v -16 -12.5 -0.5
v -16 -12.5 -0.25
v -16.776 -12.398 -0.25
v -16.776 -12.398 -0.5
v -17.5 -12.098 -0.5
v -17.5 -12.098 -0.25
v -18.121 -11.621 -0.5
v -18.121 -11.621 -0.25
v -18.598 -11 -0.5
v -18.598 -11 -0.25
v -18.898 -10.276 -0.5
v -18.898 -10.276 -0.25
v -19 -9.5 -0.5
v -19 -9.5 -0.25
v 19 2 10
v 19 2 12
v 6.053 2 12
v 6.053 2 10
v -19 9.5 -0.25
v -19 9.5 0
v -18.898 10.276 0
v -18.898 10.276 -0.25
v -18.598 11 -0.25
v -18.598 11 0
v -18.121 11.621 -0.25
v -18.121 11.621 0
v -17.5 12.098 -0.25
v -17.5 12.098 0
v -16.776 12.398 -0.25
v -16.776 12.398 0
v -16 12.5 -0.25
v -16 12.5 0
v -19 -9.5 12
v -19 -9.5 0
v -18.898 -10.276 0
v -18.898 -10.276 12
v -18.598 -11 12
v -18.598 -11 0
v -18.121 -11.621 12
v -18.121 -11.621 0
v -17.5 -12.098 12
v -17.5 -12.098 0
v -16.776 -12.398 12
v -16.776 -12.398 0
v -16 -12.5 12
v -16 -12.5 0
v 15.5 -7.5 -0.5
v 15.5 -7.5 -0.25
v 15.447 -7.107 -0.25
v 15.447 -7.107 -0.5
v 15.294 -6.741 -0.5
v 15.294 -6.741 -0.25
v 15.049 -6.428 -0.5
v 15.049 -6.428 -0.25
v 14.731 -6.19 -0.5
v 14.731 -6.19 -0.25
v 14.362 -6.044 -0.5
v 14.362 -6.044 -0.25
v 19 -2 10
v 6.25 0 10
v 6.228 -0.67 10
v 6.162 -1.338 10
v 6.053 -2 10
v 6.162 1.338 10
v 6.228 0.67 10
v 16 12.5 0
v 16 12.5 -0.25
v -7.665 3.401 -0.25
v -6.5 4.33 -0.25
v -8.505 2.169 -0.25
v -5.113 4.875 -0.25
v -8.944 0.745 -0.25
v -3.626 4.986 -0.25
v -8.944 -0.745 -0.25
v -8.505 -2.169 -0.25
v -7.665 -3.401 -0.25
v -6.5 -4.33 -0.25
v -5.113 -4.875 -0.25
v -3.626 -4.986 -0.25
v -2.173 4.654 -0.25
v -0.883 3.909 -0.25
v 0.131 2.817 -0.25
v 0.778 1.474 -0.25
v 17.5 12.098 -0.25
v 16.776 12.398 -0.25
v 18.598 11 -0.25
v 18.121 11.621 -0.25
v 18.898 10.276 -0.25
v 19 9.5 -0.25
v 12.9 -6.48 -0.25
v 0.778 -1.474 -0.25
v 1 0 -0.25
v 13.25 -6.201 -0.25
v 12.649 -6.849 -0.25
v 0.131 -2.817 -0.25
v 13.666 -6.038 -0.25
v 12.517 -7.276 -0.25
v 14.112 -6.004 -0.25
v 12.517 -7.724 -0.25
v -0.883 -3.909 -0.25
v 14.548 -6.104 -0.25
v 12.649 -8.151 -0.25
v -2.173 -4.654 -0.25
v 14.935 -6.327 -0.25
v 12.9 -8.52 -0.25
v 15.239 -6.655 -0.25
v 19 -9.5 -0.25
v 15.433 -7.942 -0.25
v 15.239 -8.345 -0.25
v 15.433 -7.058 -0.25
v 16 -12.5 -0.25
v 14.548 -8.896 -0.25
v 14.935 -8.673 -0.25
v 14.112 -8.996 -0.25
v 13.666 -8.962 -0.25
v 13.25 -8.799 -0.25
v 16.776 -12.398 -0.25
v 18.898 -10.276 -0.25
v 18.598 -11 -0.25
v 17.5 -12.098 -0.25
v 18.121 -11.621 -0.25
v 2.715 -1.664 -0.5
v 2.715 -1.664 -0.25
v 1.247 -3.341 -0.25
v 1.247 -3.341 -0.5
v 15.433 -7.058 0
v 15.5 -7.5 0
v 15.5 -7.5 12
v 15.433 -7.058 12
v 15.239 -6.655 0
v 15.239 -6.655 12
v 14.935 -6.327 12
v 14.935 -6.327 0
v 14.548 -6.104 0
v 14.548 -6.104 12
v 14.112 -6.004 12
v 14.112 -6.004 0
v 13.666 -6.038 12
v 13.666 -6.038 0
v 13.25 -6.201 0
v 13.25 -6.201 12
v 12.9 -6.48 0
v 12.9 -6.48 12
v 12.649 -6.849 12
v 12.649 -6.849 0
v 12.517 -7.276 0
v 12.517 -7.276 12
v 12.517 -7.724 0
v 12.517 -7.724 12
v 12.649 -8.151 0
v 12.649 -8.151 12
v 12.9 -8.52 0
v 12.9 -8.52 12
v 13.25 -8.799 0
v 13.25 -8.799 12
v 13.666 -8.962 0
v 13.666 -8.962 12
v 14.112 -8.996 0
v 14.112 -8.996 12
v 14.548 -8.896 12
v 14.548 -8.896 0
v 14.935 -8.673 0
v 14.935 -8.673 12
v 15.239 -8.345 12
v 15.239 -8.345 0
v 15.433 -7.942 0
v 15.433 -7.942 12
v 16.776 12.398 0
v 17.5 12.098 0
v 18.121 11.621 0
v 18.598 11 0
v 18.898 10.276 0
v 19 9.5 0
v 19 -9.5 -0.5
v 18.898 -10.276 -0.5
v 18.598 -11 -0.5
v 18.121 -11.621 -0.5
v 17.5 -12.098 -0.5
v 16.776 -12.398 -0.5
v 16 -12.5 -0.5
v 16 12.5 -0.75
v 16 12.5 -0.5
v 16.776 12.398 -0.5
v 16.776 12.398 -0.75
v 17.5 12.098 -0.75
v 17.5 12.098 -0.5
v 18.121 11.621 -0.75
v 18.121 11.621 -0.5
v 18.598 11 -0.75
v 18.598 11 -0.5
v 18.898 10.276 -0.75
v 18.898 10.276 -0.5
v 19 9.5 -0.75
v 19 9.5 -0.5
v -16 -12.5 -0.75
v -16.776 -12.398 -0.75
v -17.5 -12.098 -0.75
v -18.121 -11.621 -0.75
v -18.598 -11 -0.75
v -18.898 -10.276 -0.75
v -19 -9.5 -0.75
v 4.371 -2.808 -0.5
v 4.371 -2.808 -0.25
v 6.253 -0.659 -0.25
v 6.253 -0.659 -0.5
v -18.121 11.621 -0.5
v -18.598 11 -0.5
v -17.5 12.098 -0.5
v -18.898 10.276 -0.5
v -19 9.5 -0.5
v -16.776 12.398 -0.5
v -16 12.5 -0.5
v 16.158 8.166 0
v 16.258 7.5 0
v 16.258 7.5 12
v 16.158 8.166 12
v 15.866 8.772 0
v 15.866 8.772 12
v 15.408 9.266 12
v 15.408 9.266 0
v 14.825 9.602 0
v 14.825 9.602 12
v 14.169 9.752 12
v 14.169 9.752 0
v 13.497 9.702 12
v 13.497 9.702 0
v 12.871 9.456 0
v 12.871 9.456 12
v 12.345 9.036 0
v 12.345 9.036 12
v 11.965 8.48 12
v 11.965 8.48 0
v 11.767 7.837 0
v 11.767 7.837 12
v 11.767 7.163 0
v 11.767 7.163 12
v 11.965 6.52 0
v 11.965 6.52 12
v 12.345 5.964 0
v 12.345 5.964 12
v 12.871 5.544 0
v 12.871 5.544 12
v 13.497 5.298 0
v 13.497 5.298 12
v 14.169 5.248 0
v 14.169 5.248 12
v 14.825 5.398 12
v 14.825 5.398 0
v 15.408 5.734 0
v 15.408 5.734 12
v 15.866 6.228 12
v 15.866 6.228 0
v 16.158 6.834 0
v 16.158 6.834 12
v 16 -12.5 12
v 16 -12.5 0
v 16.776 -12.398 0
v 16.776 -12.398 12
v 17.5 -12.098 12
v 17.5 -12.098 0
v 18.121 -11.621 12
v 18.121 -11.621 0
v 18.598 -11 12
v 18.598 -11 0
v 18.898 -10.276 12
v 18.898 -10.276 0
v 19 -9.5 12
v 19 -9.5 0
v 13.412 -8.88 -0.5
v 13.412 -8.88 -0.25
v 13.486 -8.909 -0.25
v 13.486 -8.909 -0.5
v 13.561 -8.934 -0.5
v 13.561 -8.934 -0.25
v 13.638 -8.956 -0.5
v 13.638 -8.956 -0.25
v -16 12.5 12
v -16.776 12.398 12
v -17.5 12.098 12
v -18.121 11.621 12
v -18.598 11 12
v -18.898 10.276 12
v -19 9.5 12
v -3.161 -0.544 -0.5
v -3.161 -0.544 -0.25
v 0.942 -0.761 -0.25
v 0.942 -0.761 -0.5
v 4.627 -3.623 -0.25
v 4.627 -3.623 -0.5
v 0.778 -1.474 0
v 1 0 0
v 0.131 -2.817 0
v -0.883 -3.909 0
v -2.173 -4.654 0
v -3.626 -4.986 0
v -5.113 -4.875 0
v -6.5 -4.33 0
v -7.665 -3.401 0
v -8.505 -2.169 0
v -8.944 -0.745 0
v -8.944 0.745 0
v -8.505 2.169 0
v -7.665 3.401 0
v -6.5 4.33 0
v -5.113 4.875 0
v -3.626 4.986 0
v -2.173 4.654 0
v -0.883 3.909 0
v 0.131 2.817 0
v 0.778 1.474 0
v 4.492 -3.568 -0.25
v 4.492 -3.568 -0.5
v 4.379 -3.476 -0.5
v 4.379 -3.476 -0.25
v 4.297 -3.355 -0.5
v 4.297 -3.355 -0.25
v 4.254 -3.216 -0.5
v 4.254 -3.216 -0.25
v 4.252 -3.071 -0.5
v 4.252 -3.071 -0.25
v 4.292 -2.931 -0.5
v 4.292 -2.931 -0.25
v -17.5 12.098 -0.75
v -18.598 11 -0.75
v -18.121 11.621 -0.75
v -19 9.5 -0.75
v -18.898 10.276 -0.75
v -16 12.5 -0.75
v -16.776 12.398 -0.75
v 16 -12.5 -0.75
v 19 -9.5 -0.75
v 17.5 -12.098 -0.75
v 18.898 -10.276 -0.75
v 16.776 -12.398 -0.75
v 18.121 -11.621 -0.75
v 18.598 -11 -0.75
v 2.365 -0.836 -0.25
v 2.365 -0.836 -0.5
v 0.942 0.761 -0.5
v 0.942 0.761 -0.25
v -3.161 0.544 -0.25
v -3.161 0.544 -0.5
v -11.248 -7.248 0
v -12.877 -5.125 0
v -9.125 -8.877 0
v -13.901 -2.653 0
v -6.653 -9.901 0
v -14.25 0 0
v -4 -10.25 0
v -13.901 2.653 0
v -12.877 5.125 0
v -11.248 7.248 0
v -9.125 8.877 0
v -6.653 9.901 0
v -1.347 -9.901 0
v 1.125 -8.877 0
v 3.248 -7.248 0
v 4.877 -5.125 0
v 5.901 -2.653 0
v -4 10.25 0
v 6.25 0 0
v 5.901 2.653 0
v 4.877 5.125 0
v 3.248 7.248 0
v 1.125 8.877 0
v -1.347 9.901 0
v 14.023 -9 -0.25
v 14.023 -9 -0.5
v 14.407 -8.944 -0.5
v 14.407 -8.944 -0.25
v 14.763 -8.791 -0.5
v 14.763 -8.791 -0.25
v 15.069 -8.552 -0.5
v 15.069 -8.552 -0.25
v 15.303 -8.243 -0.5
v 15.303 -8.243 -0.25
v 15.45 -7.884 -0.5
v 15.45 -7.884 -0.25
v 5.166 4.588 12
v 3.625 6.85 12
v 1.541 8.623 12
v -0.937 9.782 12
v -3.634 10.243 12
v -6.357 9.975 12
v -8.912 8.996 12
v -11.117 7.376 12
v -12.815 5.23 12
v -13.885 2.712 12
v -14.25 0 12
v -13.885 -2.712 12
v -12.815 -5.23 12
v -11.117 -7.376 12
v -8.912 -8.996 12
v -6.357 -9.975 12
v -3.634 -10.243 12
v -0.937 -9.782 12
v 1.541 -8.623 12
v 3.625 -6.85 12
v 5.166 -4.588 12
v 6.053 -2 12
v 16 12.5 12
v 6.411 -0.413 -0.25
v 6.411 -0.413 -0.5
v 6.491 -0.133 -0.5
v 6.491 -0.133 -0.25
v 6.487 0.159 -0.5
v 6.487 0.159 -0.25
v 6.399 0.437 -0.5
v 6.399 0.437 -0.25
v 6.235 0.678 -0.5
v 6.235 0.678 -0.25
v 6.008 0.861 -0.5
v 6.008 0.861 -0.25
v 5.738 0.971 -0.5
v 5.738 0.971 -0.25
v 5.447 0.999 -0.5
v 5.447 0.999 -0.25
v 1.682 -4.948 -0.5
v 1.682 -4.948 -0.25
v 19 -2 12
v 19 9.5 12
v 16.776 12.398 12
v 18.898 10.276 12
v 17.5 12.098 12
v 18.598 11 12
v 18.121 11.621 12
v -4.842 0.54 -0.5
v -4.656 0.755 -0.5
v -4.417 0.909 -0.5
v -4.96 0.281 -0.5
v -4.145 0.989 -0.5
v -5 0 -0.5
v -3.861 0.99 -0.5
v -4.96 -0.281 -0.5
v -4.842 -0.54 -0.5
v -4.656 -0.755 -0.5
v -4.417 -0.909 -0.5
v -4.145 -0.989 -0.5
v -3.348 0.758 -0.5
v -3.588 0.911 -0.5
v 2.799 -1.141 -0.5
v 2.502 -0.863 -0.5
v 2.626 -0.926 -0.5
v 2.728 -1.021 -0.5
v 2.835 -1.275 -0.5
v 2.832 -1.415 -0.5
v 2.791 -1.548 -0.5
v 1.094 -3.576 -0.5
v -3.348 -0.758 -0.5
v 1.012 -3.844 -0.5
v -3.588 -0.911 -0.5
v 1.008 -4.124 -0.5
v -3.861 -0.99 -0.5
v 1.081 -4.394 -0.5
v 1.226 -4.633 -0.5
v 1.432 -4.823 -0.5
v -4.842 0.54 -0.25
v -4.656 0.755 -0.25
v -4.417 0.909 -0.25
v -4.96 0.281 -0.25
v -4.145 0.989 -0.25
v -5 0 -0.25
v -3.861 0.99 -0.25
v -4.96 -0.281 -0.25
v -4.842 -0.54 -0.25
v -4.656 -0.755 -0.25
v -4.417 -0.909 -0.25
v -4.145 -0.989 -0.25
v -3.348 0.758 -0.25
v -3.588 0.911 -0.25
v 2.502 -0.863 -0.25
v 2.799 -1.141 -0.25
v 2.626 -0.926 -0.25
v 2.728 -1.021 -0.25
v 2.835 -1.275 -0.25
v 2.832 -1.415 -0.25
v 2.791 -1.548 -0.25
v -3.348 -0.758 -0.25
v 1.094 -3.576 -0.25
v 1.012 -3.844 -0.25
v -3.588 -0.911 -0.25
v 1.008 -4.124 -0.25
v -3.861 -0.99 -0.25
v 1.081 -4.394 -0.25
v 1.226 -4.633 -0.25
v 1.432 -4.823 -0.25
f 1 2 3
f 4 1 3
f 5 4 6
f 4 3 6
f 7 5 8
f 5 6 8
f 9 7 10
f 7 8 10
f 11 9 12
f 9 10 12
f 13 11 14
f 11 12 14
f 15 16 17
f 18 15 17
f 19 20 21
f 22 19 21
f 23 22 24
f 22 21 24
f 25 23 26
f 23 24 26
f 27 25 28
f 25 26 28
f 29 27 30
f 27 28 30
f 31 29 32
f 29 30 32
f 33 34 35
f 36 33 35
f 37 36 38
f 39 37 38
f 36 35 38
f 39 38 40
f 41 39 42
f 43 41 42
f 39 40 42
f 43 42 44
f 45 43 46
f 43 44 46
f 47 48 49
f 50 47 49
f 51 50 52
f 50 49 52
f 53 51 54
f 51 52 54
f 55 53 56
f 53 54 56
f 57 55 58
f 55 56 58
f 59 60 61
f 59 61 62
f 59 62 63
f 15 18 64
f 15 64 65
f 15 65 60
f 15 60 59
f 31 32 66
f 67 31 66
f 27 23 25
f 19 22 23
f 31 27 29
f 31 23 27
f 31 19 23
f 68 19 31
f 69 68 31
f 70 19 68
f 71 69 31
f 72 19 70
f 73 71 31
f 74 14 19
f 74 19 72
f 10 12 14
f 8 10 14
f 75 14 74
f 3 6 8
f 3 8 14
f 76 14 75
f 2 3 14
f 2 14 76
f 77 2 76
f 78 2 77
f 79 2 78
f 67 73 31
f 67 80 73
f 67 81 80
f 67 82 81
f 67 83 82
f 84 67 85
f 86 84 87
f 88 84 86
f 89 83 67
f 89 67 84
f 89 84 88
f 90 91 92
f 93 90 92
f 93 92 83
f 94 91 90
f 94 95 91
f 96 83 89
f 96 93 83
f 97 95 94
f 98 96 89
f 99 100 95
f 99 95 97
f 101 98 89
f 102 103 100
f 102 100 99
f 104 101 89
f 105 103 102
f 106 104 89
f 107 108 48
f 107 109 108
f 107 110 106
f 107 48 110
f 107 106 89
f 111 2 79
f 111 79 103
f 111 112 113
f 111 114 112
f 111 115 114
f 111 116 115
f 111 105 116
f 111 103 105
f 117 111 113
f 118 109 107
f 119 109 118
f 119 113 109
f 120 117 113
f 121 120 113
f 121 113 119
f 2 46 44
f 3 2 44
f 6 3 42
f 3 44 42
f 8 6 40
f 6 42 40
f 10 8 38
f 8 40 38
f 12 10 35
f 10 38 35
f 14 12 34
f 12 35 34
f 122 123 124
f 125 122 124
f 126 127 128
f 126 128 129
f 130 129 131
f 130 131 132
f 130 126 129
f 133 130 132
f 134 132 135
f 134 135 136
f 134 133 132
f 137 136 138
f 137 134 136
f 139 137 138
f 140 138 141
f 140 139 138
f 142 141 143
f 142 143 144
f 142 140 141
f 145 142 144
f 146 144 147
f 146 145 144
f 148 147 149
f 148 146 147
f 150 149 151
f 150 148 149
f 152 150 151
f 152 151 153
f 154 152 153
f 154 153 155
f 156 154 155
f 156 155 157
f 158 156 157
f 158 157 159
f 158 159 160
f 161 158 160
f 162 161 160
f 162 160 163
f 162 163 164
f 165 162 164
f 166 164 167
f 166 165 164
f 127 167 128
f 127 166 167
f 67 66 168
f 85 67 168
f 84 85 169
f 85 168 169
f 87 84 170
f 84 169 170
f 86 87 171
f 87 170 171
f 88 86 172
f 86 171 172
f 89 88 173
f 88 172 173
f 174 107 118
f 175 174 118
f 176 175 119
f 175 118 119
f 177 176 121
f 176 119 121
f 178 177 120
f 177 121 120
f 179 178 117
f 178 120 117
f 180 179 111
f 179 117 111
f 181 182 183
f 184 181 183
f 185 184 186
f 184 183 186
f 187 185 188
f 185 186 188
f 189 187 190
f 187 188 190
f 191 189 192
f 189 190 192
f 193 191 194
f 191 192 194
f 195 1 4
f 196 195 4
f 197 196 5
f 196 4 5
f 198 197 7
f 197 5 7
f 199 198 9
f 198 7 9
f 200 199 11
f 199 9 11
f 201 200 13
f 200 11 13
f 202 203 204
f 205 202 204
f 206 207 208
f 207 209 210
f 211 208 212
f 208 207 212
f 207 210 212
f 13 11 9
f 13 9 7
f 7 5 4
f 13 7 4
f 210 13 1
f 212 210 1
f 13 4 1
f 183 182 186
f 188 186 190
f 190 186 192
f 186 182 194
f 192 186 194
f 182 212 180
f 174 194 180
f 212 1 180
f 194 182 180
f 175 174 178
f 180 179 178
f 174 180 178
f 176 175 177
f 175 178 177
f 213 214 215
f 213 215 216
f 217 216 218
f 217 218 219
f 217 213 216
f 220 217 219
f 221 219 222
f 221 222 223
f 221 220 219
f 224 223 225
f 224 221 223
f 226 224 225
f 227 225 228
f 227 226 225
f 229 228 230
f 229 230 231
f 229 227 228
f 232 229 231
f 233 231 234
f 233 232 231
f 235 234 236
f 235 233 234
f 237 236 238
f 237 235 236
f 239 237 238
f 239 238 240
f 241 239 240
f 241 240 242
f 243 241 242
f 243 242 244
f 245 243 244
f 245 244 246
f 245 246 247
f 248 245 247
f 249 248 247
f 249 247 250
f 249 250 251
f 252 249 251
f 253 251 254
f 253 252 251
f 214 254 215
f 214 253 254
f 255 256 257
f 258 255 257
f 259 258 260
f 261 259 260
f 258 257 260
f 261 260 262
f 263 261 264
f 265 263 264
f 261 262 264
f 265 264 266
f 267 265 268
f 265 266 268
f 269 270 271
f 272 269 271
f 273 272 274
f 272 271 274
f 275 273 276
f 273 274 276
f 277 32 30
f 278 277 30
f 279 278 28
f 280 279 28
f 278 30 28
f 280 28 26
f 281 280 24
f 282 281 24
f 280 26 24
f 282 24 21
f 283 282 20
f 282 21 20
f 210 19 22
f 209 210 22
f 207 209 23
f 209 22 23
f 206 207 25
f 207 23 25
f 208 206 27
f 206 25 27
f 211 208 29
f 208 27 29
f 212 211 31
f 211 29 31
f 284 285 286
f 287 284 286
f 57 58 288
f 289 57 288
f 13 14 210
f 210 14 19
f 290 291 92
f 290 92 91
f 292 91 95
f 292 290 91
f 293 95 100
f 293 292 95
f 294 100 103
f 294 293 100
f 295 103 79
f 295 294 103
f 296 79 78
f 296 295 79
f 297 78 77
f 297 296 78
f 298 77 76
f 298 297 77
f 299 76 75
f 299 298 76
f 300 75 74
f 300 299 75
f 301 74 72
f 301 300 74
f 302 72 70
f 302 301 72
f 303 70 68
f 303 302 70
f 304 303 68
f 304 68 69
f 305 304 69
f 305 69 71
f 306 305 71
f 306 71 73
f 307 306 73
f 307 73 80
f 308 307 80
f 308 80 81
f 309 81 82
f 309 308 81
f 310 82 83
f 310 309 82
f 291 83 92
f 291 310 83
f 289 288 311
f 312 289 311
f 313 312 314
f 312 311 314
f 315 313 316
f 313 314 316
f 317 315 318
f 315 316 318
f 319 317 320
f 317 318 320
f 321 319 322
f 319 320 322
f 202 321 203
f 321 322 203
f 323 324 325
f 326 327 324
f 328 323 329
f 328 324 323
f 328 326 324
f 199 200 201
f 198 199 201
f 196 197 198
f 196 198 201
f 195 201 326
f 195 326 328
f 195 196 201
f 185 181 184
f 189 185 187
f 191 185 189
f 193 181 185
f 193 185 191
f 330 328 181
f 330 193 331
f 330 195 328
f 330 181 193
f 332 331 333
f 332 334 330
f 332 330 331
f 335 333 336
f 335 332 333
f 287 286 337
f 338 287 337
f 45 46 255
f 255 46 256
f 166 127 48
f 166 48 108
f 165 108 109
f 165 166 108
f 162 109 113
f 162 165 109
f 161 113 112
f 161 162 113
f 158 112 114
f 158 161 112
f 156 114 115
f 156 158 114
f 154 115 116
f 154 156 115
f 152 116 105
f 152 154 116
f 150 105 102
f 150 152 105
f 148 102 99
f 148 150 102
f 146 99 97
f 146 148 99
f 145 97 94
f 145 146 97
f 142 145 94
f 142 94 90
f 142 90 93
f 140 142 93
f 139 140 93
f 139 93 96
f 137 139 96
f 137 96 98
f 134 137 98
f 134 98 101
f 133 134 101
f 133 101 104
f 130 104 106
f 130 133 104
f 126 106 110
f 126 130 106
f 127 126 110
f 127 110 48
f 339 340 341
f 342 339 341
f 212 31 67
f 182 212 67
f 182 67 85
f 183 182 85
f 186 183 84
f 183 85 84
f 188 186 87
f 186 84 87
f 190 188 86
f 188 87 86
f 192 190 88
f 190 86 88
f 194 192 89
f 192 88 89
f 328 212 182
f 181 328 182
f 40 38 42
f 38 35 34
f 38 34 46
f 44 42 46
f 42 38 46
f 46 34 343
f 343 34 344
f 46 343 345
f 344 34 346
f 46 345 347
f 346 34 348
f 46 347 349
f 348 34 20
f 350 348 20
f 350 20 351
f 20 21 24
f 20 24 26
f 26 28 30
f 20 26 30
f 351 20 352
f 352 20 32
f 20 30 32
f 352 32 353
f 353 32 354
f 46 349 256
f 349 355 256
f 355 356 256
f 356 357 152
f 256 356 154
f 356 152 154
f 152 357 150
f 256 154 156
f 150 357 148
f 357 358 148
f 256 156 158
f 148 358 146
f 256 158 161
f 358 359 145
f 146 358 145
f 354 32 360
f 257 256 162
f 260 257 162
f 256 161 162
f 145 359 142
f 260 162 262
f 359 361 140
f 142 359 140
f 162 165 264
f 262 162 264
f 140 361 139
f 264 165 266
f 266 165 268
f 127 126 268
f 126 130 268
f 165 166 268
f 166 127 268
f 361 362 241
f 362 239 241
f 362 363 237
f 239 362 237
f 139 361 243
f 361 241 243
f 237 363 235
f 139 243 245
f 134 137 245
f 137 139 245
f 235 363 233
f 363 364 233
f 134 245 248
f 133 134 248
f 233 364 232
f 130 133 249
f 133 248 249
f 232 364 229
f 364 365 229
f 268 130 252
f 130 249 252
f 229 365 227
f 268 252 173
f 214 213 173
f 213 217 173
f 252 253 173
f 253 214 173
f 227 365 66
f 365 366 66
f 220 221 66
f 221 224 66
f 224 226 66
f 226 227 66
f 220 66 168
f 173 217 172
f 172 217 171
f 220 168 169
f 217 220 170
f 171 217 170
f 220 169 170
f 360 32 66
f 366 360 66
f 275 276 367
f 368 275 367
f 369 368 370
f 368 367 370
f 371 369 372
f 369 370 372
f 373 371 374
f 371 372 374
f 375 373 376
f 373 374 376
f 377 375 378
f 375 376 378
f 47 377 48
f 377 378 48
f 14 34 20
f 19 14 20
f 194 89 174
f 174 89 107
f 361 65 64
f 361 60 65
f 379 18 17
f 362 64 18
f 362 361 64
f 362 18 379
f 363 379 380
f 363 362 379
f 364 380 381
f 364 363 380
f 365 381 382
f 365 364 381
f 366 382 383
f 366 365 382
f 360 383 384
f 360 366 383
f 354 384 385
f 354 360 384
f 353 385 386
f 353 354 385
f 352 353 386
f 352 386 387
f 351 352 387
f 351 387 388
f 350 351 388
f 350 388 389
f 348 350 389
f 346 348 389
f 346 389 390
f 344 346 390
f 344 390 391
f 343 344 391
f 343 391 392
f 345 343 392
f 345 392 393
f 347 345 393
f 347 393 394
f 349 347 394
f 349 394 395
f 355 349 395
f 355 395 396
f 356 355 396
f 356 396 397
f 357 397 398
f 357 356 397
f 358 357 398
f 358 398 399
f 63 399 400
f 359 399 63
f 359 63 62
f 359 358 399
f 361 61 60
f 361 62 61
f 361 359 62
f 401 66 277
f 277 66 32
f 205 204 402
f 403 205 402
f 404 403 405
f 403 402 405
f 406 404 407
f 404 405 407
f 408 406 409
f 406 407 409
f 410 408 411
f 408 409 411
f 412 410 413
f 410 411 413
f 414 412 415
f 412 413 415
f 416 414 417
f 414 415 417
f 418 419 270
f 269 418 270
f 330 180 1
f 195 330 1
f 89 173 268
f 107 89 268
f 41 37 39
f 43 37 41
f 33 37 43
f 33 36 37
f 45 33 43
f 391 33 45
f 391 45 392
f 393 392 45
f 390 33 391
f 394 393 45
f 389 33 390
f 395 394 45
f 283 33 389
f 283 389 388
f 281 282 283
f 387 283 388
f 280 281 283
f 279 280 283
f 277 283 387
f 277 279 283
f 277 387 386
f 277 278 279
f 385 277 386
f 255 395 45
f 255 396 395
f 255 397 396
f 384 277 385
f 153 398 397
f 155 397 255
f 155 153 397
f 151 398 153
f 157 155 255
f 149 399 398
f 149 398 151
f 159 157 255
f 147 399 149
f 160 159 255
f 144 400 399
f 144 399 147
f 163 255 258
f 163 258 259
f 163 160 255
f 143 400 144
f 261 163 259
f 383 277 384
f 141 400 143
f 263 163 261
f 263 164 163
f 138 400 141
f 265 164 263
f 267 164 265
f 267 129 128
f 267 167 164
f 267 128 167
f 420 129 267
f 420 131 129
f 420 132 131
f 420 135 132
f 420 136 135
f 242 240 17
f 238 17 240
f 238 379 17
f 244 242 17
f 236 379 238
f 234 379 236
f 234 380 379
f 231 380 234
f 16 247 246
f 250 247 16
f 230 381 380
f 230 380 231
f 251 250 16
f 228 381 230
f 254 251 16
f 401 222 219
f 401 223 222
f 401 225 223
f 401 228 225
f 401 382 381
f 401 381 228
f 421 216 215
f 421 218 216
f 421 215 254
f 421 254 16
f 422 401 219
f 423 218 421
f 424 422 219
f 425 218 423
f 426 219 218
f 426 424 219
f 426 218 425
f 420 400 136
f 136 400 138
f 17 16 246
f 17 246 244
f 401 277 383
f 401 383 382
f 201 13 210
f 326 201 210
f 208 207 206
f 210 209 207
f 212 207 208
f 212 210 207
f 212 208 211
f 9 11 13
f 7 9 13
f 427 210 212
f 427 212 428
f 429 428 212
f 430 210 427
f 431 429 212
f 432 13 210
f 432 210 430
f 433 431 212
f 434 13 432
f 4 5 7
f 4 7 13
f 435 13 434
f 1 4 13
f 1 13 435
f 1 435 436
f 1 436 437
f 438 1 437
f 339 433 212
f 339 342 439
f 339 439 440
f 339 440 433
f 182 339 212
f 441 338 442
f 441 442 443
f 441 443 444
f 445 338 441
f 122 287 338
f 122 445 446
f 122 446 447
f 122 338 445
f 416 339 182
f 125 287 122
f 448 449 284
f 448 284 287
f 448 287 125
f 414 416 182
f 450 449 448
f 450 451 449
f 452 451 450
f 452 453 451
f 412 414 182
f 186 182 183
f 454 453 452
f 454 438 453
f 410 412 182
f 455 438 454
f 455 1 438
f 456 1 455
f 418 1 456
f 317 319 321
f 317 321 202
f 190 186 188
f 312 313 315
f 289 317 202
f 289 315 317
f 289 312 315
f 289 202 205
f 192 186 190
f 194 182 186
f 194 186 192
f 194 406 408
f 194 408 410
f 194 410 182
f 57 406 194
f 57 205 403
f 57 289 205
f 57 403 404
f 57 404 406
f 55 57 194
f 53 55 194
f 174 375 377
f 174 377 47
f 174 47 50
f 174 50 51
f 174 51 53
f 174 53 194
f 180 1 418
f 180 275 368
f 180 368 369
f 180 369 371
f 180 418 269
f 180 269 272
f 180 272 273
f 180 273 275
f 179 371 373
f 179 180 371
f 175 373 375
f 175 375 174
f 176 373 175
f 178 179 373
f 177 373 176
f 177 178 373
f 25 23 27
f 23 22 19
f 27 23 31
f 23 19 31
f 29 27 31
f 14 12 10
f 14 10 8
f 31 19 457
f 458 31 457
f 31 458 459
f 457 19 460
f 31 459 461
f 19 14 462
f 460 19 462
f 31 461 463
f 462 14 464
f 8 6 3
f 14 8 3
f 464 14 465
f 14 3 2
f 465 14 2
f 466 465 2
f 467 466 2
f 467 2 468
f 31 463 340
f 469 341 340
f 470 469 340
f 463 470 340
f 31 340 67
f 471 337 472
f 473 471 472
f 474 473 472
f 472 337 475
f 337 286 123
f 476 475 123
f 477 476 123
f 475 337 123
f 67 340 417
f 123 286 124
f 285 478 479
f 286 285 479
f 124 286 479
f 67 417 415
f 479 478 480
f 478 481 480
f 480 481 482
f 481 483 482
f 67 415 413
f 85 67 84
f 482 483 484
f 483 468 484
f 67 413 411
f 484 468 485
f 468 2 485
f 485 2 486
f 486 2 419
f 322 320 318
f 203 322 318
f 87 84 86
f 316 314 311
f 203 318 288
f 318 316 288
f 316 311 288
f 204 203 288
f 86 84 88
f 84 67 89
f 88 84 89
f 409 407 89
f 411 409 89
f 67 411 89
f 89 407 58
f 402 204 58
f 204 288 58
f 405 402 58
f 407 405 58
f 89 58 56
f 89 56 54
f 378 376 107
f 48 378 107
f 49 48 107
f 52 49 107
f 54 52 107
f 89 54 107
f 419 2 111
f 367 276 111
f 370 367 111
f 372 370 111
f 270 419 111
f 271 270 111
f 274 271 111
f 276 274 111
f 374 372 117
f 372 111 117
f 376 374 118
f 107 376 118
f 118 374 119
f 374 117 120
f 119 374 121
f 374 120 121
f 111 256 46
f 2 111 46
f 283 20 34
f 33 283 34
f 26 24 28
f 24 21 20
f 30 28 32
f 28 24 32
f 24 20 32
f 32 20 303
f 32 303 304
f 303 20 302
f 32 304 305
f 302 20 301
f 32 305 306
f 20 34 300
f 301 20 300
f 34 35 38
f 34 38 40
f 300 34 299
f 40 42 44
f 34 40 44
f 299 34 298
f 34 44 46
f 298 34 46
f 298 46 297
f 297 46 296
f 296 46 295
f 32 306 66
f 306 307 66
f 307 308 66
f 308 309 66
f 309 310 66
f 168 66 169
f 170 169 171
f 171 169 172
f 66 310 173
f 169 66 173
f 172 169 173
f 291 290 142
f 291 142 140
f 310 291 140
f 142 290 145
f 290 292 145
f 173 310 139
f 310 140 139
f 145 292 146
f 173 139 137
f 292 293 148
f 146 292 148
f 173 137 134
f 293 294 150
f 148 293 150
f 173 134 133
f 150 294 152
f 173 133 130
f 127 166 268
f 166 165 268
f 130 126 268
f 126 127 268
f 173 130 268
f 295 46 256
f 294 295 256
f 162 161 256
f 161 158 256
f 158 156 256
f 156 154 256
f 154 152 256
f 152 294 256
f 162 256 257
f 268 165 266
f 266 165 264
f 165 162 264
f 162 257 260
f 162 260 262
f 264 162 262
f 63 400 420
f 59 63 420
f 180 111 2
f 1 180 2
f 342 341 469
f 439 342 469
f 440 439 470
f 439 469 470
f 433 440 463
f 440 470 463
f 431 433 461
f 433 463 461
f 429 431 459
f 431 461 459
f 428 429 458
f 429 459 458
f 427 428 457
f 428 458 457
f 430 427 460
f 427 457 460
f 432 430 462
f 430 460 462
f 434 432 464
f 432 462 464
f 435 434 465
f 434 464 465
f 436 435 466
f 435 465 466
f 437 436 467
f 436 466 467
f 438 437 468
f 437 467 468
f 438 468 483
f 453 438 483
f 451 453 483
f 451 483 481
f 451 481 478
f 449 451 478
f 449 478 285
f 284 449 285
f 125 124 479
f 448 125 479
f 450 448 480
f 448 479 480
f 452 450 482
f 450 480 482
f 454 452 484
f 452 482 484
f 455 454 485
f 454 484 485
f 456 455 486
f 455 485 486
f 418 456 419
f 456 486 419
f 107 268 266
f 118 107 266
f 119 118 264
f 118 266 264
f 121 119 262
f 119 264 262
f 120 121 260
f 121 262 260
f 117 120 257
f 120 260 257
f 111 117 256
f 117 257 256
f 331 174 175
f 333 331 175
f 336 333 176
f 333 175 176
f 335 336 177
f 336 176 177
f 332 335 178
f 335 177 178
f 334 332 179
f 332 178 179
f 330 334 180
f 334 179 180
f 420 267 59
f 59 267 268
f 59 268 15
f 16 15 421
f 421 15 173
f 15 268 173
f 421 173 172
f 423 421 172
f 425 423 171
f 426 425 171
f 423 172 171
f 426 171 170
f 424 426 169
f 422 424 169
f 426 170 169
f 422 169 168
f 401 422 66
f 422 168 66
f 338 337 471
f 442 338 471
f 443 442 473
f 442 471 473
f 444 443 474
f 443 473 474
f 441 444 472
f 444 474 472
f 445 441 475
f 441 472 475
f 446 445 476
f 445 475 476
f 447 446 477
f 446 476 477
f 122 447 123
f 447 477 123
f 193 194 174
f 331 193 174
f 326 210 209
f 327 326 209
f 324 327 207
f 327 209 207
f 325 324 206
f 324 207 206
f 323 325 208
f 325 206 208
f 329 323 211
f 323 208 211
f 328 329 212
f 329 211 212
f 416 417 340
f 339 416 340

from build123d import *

# Parameters (mm, degrees)
F0_R     = 1.5
F0_R_2   = 10.25
F0_R_3   = 2.2582291175
F1_DEPTH = 12
F3_DEPTH = 2
F4_R     = 2.2582291175
F4_R_2   = 10.25
F4_R_3   = 1.5
F4_R_4   = 5
F5_DEPTH = 0.25
F7_DEPTH = 0.25
F9_DEPTH = 0.25


with BuildPart() as f1:
    # F0 (on Top) → F1 (new body)
    with BuildSketch(Plane.XY):
        with BuildLine():
            Line((-16, -12.5), (16, -12.5))
            ThreePointArc((16, -12.5), (18.1213203436, -11.6213203436), (19, -9.5))
            Line((19, -9.5), (19, 9.5))
            ThreePointArc((19, 9.5), (18.1213203436, 11.6213203436), (16, 12.5))
            Line((16, 12.5), (-16, 12.5))
            ThreePointArc((-16, 12.5), (-18.1213203436, 11.6213203436), (-19, 9.5))
            Line((-19, 9.5), (-19, -9.5))
            ThreePointArc((-19, -9.5), (-18.1213203436, -11.6213203436), (-16, -12.5))
        make_face()
        with Locations((14, -7.5)):
            Circle(F0_R, mode=Mode.SUBTRACT)
        with Locations((-4, 0)):
            Circle(F0_R_2, mode=Mode.SUBTRACT)
        with Locations((14, 7.5)):
            Circle(F0_R_3, mode=Mode.SUBTRACT)
    extrude(amount=F1_DEPTH)

    # F2 (on face) → F3 (cut)
    with BuildSketch(Plane.XY.offset(12)):
        with BuildLine():
            Line((6.0529846314, -2), (19, -2))
            Line((19, -2), (19, 2))
            Line((19, 2), (6.0529846314, 2))
            ThreePointArc((6.0529846314, 2), (6.2006272472, 1.0048401683), (6.25, 0))
            ThreePointArc((6.25, 0), (6.2006272472, -1.0048401683), (6.0529846314, -2))
        make_face()
    extrude(amount=-F3_DEPTH, mode=Mode.SUBTRACT)


with BuildPart() as f5:
    # F4 (on face) → F5 (new body)
    with BuildSketch(Plane(origin=(0, 0, 0), x_dir=(1, 0, 0), z_dir=(0, 0, -1))):
        with BuildLine():
            Line((-16, -12.5), (16, -12.5))
            ThreePointArc((16, -12.5), (18.1213203436, -11.6213203436), (19, -9.5))
            Line((19, -9.5), (19, 9.5))
            ThreePointArc((19, 9.5), (18.1213203436, 11.6213203436), (16, 12.5))
            Line((16, 12.5), (-16, 12.5))
            ThreePointArc((-16, 12.5), (-18.1213203436, 11.6213203436), (-19, 9.5))
            Line((-19, 9.5), (-19, -9.5))
            ThreePointArc((-19, -9.5), (-18.1213203436, -11.6213203436), (-16, -12.5))
        make_face()
        with Locations((14, -7.5)):
            Circle(F4_R, mode=Mode.SUBTRACT)
        with Locations((-4, 0)):
            Circle(F4_R_2, mode=Mode.SUBTRACT)
        with Locations((14, 7.5)):
            Circle(F4_R_3, mode=Mode.SUBTRACT)
        with Locations((-4, 0)):
            Circle(F4_R_2)
        with Locations((-4, 0)):
            Circle(F4_R_4, mode=Mode.SUBTRACT)
        with Locations((14, -7.5)):
            Circle(F4_R)
    extrude(amount=F5_DEPTH)


with BuildPart() as f7:
    # F6 (on face) → F7 (new body)
    with BuildSketch(Plane(origin=(0, 0, -0.25), x_dir=(1, 0, 0), z_dir=(0, 0, -1))):
        with BuildLine():
            Line((-16, -12.5), (16, -12.5))
            ThreePointArc((16, -12.5), (18.1213203436, -11.6213203436), (19, -9.5))
            Line((19, -9.5), (19, 9.5))
            ThreePointArc((19, 9.5), (18.1213203436, 11.6213203436), (16, 12.5))
            Line((16, 12.5), (-16, 12.5))
            ThreePointArc((-16, 12.5), (-18.1213203436, 11.6213203436), (-19, 9.5))
            Line((-19, 9.5), (-19, -9.5))
            ThreePointArc((-19, -9.5), (-18.1213203436, -11.6213203436), (-16, -12.5))
        make_face()
        with BuildLine():
            ThreePointArc((15.5, 7.5), (15.1817562774, 6.5761752867), (14.3620638655, 6.0443524612))
            Line((14.3620638655, 6.0443524612), (4.6269595937, 3.6229356074))
            ThreePointArc((4.6269595937, 3.6229356074), (4.2705878532, 3.2874329762), (4.3713592015, 2.8084674572))
            Line((4.3713592015, 2.8084674572), (6.2525766947, 0.6585046079))
            ThreePointArc((6.2525766947, 0.6585046079), (6.3994234341, -0.4370783525), (5.4472952705, -0.9986101399))
            Line((5.4472952705, -0.9986101399), (0.9417766772, -0.7608175028))
            ThreePointArc((0.9417766772, -0.7608175028), (-9, 0), (0.9417766772, 0.7608175028))
            Line((0.9417766772, 0.7608175028), (2.3648730135, 0.8359258002))
            ThreePointArc((2.3648730135, 0.8359258002), (2.7991253775, 1.1406973672), (2.7148089961, 1.6644831741))
            Line((2.7148089961, 1.6644831741), (1.2474233053, 3.3414953921))
            ThreePointArc((1.2474233053, 3.3414953921), (1.0347168502, 4.261205744), (1.6821849895, 4.9481527404))
            Line((1.6821849895, 4.9481527404), (13.4116409153, 8.8797947628))
            ThreePointArc((13.4116409153, 8.8797947628), (13.5232774843, 8.9222291106), (13.6379361345, 8.9556475388))
            ThreePointArc((13.6379361345, 8.9556475388), (14.9238247133, 8.6817562774), (15.5, 7.5))
        make_face(mode=Mode.SUBTRACT)
        with BuildLine():
            ThreePointArc((0.9417766772, 0.7608175028), (-9, 0), (0.9417766772, -0.7608175028))
            Line((0.9417766772, -0.7608175028), (-3.1610936997, -0.5442758669))
            ThreePointArc((-3.1610936997, -0.5442758669), (-5, 0), (-3.1610936997, 0.5442758669))
            Line((-3.1610936997, 0.5442758669), (0.9417766772, 0.7608175028))
        make_face()
    extrude(amount=F7_DEPTH)


with BuildPart() as f9:
    # F8 (on face) → F9 (new body)
    with BuildSketch(Plane(origin=(0, 0, -0.5), x_dir=(1, 0, 0), z_dir=(0, 0, -1))):
        with BuildLine():
            Line((-16, -12.5), (16, -12.5))
            ThreePointArc((16, -12.5), (18.1213203436, -11.6213203436), (19, -9.5))
            Line((19, -9.5), (19, 9.5))
            ThreePointArc((19, 9.5), (18.1213203436, 11.6213203436), (16, 12.5))
            Line((16, 12.5), (-16, 12.5))
            ThreePointArc((-16, 12.5), (-18.1213203436, 11.6213203436), (-19, 9.5))
            Line((-19, 9.5), (-19, -9.5))
            ThreePointArc((-19, -9.5), (-18.1213203436, -11.6213203436), (-16, -12.5))
        make_face()
        with BuildLine():
            Line((-3.1610936997, 0.5442758669), (2.3648730135, 0.8359258002))
            ThreePointArc((2.3648730135, 0.8359258002), (2.7991253775, 1.1406973672), (2.7148089961, 1.6644831741))
            Line((2.7148089961, 1.6644831741), (1.2474233053, 3.3414953921))
            ThreePointArc((1.2474233053, 3.3414953921), (1.0347168502, 4.261205744), (1.6821849895, 4.9481527404))
            Line((1.6821849895, 4.9481527404), (13.4116409153, 8.8797947628))
            ThreePointArc((13.4116409153, 8.8797947628), (15.4222291106, 7.9767225157), (14.3620638655, 6.0443524612))
            Line((14.3620638655, 6.0443524612), (4.6269595937, 3.6229356074))
            ThreePointArc((4.6269595937, 3.6229356074), (4.2705878532, 3.2874329762), (4.3713592015, 2.8084674572))
            Line((4.3713592015, 2.8084674572), (6.2525766947, 0.6585046079))
            ThreePointArc((6.2525766947, 0.6585046079), (6.3994234341, -0.4370783525), (5.4472952705, -0.9986101399))
            Line((5.4472952705, -0.9986101399), (-3.1610936997, -0.5442758669))
            ThreePointArc((-3.1610936997, -0.5442758669), (-5, 0), (-3.1610936997, 0.5442758669))
        make_face(mode=Mode.SUBTRACT)
        with BuildLine():
            ThreePointArc((2.7148089961, 1.6644831741), (2.7991253775, 1.1406973672), (2.3648730135, 0.8359258002))
            Line((2.3648730135, 0.8359258002), (-3.1610936997, 0.5442758669))
            ThreePointArc((-3.1610936997, 0.5442758669), (-5, 0), (-3.1610936997, -0.5442758669))
            Line((-3.1610936997, -0.5442758669), (5.4472952705, -0.9986101399))
            ThreePointArc((5.4472952705, -0.9986101399), (6.3994234341, -0.4370783525), (6.2525766947, 0.6585046079))
            Line((6.2525766947, 0.6585046079), (4.3713592015, 2.8084674572))
            ThreePointArc((4.3713592015, 2.8084674572), (4.2705878532, 3.2874329762), (4.6269595937, 3.6229356074))
            Line((4.6269595937, 3.6229356074), (14.3620638655, 6.0443524612))
            ThreePointArc((14.3620638655, 6.0443524612), (15.4222291106, 7.9767225157), (13.4116409153, 8.8797947628))
            Line((13.4116409153, 8.8797947628), (1.6821849895, 4.9481527404))
            ThreePointArc((1.6821849895, 4.9481527404), (1.0347168502, 4.261205744), (1.2474233053, 3.3414953921))
            Line((1.2474233053, 3.3414953921), (2.7148089961, 1.6644831741))
        make_face()
    extrude(amount=F9_DEPTH)


solid = Compound([f1.part, f5.part, f7.part, f9.part])
